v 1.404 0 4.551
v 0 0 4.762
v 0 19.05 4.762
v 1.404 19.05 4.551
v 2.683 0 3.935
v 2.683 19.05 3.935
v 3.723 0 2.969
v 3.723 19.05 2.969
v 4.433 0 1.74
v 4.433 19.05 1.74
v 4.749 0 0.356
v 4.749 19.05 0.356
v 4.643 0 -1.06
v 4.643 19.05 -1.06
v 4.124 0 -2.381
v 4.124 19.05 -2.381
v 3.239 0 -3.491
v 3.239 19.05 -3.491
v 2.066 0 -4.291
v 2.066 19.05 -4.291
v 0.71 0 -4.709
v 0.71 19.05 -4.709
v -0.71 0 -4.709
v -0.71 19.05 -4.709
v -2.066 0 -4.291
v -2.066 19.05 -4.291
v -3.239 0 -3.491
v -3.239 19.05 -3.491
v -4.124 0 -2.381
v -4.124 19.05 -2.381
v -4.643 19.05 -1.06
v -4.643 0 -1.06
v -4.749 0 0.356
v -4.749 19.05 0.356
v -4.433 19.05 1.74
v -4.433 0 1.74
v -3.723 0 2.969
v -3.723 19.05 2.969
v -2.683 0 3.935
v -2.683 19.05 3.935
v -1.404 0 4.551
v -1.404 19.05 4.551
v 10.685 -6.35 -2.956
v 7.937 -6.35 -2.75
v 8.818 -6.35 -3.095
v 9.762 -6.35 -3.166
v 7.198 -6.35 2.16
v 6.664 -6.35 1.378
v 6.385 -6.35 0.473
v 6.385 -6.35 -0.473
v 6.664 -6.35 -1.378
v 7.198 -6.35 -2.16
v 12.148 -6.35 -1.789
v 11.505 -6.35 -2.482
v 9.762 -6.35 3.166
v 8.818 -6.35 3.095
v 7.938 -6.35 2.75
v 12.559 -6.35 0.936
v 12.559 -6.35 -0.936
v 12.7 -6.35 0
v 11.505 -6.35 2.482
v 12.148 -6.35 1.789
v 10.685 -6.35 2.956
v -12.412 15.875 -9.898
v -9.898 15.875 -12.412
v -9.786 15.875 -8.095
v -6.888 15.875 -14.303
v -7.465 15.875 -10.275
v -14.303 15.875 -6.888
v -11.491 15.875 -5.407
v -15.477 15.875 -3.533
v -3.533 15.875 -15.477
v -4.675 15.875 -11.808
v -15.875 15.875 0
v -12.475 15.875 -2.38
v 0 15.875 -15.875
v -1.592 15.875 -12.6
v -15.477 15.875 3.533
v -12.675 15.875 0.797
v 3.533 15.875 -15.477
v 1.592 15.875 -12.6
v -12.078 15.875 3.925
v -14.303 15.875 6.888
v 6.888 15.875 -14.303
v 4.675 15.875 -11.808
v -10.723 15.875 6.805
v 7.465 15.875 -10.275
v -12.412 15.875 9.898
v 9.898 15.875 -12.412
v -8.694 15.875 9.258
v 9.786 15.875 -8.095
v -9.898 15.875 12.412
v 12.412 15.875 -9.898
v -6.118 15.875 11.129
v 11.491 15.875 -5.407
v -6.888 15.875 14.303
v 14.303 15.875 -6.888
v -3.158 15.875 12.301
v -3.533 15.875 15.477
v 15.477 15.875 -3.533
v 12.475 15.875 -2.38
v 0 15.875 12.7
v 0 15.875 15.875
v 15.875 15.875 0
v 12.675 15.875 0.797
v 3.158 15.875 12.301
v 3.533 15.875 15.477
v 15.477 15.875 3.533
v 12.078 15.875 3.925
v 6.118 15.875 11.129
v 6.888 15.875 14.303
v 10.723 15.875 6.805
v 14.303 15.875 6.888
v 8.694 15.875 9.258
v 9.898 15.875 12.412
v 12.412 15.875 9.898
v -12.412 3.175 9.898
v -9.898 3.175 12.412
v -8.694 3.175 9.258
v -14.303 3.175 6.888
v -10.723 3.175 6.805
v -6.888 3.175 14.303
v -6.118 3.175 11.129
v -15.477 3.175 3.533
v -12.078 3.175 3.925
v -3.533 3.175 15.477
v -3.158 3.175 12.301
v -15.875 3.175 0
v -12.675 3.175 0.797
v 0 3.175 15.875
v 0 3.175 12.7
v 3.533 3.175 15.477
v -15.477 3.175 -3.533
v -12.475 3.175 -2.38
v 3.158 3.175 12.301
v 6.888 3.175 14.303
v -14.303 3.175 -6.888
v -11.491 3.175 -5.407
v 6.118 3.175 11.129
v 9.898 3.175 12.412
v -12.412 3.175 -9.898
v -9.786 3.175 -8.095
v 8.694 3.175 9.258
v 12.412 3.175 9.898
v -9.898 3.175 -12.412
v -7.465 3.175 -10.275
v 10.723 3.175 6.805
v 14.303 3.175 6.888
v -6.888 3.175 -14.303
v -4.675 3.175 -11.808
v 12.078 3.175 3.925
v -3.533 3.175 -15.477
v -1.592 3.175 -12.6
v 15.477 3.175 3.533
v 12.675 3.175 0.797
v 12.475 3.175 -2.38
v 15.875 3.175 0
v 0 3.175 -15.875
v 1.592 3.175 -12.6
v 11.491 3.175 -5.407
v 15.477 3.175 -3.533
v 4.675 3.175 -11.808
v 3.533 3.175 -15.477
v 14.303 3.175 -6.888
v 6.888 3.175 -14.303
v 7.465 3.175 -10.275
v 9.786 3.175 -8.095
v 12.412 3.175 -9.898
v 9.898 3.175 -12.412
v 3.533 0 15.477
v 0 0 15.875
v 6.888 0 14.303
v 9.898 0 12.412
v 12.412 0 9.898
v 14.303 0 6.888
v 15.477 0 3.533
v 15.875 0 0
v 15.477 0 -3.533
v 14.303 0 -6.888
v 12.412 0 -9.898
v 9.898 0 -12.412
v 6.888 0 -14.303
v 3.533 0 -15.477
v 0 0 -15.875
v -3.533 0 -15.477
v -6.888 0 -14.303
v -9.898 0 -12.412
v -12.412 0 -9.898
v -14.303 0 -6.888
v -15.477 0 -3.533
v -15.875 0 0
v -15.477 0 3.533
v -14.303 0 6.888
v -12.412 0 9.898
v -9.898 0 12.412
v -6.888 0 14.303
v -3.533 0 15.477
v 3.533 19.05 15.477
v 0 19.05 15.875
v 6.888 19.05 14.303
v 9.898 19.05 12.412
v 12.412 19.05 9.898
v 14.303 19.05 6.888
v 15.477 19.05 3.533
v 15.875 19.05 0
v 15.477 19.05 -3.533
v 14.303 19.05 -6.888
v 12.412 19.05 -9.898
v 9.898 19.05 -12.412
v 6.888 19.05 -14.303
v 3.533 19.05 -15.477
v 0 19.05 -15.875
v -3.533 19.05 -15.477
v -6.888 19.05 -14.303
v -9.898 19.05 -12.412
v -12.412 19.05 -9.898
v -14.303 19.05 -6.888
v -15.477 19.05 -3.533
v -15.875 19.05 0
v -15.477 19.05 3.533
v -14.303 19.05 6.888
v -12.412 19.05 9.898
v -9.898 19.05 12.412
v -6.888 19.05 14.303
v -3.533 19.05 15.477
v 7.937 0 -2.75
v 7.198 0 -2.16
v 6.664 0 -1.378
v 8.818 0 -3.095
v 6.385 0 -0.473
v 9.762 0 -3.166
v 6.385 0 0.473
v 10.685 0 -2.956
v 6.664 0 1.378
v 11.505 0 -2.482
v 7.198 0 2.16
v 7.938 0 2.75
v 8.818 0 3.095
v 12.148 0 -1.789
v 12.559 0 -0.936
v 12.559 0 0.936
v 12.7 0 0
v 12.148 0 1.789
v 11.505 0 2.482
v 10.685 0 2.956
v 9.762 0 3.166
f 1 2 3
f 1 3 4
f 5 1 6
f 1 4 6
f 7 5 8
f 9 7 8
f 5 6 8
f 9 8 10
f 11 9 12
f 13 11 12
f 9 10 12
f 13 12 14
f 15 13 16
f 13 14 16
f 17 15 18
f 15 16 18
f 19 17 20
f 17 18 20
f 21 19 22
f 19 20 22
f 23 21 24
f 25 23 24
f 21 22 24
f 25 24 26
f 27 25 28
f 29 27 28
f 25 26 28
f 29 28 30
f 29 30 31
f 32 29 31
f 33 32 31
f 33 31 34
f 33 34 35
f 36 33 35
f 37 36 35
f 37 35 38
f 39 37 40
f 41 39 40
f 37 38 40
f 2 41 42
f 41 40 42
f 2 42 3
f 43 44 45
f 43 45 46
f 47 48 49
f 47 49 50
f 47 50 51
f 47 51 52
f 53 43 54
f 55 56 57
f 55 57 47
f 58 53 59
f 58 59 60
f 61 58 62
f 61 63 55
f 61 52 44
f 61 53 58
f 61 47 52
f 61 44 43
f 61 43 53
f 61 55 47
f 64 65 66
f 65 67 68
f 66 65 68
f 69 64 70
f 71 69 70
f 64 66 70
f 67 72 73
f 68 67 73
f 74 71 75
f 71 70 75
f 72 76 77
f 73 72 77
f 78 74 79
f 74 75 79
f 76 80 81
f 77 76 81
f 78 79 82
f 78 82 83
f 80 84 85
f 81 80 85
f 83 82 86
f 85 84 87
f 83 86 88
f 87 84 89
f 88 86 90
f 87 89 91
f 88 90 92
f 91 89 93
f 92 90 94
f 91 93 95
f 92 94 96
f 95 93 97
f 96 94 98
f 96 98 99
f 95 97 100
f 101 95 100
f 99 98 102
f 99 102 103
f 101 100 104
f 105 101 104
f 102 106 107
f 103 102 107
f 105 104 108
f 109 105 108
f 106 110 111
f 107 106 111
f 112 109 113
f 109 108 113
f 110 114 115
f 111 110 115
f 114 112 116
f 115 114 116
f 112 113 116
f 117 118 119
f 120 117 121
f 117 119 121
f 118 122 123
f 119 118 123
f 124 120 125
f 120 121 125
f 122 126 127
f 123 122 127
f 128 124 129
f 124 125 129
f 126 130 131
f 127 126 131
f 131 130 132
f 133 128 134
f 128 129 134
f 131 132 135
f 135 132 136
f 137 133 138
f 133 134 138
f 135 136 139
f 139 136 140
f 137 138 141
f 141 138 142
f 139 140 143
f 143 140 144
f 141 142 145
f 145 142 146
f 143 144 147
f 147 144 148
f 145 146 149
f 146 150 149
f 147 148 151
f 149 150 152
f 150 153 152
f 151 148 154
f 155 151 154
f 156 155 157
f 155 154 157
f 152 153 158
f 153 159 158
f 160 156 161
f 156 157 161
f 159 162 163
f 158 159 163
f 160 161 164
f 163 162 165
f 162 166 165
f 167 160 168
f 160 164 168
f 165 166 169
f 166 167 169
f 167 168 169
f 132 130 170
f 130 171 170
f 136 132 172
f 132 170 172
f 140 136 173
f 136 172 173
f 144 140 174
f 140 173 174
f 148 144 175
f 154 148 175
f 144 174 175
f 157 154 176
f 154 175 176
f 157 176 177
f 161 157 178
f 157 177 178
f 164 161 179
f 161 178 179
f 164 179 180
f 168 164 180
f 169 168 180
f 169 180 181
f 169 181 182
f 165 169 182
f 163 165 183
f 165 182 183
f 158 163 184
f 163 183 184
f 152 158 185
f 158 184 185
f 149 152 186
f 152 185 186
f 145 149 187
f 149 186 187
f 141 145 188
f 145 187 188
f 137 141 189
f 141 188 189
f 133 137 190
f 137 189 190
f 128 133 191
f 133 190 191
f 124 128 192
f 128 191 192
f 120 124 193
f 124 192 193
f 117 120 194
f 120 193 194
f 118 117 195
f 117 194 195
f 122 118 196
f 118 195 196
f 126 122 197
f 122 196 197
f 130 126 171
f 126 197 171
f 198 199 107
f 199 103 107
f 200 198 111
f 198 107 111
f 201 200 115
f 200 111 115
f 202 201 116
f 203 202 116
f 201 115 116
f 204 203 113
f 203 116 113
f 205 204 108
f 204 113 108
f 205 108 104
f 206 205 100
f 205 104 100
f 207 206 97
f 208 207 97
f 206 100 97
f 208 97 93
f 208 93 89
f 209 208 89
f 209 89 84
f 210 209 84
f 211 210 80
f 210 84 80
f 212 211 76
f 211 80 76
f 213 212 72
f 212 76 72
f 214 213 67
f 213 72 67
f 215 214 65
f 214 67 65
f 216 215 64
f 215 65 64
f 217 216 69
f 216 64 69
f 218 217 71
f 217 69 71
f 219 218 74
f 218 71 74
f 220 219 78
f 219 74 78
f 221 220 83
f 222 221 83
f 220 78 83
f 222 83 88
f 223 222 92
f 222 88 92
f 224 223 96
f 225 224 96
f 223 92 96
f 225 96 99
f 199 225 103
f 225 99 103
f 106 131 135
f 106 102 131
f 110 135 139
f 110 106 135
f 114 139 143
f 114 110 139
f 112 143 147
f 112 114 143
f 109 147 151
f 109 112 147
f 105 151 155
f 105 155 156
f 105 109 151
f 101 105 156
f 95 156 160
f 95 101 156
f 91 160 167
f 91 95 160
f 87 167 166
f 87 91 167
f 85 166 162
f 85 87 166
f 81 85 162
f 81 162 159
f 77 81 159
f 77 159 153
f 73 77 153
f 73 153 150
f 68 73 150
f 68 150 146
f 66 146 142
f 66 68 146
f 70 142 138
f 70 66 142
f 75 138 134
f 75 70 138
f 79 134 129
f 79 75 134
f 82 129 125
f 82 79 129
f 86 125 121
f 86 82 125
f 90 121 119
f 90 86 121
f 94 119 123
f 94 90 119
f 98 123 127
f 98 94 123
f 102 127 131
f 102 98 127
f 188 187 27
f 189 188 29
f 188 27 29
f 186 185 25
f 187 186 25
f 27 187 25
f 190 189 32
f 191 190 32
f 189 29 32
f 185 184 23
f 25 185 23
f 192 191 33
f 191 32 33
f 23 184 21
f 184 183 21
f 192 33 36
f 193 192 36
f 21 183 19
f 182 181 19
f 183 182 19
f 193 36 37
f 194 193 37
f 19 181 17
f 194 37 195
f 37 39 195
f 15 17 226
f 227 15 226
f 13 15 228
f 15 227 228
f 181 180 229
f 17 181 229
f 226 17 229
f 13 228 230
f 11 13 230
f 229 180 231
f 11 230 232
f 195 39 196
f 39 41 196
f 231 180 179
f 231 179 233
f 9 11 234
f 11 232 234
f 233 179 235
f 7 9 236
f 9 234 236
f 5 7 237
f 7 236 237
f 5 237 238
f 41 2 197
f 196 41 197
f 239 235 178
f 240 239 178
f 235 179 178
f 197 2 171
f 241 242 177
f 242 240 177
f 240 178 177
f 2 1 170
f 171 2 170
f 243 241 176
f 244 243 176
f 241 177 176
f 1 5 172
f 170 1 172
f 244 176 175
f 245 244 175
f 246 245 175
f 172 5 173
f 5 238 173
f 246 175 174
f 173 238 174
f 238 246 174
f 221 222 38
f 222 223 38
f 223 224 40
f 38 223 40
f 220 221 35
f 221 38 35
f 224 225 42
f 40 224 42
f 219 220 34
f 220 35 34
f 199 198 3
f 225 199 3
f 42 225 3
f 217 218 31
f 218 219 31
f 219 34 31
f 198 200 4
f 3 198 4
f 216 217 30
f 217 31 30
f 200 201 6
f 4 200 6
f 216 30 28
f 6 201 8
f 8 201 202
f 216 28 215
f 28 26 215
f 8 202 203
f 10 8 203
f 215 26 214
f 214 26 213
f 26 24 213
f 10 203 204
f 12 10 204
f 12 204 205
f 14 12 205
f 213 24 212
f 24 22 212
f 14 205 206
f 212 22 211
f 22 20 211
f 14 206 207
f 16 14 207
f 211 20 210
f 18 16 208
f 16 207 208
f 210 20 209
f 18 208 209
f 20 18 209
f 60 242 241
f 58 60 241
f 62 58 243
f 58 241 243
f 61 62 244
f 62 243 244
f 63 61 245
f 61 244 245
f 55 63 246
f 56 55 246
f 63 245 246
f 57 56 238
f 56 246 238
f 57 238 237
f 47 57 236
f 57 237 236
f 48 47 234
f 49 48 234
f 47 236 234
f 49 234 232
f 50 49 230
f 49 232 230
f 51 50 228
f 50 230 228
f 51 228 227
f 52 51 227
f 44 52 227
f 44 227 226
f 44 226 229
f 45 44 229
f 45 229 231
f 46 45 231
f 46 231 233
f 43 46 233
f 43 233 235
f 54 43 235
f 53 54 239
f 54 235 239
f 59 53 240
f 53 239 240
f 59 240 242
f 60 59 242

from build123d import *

# Parameters (mm, degrees)
F0_W     = 12.7
F0_H     = 7.9375
F2_R     = 3.175
F3_DEPTH = 6.35


with BuildPart() as f1:
    # F0 (on Right) → F1 (revolve)
    with BuildSketch(Plane.YZ):
        with Locations((9.525, 8.73125)):
            Rectangle(F0_W, F0_H)
        Polygon((0, 4.7625), (3.175, 4.7625), (3.175, 12.7), (3.175, 15.875), (0, 15.875), align=None)
        Polygon((15.875, 4.7625), (19.05, 4.7625), (19.05, 15.875), (15.875, 15.875), (15.875, 12.7), align=None)
    revolve(axis=Axis((0, 9.525, 0), (0, 1, 0)))

    # F2 (on Front) → F3 (join)
    with BuildSketch(Plane.XZ):
        with Locations((9.525, 0)):
            Circle(F2_R)
    extrude(amount=F3_DEPTH)


solid = f1.part
